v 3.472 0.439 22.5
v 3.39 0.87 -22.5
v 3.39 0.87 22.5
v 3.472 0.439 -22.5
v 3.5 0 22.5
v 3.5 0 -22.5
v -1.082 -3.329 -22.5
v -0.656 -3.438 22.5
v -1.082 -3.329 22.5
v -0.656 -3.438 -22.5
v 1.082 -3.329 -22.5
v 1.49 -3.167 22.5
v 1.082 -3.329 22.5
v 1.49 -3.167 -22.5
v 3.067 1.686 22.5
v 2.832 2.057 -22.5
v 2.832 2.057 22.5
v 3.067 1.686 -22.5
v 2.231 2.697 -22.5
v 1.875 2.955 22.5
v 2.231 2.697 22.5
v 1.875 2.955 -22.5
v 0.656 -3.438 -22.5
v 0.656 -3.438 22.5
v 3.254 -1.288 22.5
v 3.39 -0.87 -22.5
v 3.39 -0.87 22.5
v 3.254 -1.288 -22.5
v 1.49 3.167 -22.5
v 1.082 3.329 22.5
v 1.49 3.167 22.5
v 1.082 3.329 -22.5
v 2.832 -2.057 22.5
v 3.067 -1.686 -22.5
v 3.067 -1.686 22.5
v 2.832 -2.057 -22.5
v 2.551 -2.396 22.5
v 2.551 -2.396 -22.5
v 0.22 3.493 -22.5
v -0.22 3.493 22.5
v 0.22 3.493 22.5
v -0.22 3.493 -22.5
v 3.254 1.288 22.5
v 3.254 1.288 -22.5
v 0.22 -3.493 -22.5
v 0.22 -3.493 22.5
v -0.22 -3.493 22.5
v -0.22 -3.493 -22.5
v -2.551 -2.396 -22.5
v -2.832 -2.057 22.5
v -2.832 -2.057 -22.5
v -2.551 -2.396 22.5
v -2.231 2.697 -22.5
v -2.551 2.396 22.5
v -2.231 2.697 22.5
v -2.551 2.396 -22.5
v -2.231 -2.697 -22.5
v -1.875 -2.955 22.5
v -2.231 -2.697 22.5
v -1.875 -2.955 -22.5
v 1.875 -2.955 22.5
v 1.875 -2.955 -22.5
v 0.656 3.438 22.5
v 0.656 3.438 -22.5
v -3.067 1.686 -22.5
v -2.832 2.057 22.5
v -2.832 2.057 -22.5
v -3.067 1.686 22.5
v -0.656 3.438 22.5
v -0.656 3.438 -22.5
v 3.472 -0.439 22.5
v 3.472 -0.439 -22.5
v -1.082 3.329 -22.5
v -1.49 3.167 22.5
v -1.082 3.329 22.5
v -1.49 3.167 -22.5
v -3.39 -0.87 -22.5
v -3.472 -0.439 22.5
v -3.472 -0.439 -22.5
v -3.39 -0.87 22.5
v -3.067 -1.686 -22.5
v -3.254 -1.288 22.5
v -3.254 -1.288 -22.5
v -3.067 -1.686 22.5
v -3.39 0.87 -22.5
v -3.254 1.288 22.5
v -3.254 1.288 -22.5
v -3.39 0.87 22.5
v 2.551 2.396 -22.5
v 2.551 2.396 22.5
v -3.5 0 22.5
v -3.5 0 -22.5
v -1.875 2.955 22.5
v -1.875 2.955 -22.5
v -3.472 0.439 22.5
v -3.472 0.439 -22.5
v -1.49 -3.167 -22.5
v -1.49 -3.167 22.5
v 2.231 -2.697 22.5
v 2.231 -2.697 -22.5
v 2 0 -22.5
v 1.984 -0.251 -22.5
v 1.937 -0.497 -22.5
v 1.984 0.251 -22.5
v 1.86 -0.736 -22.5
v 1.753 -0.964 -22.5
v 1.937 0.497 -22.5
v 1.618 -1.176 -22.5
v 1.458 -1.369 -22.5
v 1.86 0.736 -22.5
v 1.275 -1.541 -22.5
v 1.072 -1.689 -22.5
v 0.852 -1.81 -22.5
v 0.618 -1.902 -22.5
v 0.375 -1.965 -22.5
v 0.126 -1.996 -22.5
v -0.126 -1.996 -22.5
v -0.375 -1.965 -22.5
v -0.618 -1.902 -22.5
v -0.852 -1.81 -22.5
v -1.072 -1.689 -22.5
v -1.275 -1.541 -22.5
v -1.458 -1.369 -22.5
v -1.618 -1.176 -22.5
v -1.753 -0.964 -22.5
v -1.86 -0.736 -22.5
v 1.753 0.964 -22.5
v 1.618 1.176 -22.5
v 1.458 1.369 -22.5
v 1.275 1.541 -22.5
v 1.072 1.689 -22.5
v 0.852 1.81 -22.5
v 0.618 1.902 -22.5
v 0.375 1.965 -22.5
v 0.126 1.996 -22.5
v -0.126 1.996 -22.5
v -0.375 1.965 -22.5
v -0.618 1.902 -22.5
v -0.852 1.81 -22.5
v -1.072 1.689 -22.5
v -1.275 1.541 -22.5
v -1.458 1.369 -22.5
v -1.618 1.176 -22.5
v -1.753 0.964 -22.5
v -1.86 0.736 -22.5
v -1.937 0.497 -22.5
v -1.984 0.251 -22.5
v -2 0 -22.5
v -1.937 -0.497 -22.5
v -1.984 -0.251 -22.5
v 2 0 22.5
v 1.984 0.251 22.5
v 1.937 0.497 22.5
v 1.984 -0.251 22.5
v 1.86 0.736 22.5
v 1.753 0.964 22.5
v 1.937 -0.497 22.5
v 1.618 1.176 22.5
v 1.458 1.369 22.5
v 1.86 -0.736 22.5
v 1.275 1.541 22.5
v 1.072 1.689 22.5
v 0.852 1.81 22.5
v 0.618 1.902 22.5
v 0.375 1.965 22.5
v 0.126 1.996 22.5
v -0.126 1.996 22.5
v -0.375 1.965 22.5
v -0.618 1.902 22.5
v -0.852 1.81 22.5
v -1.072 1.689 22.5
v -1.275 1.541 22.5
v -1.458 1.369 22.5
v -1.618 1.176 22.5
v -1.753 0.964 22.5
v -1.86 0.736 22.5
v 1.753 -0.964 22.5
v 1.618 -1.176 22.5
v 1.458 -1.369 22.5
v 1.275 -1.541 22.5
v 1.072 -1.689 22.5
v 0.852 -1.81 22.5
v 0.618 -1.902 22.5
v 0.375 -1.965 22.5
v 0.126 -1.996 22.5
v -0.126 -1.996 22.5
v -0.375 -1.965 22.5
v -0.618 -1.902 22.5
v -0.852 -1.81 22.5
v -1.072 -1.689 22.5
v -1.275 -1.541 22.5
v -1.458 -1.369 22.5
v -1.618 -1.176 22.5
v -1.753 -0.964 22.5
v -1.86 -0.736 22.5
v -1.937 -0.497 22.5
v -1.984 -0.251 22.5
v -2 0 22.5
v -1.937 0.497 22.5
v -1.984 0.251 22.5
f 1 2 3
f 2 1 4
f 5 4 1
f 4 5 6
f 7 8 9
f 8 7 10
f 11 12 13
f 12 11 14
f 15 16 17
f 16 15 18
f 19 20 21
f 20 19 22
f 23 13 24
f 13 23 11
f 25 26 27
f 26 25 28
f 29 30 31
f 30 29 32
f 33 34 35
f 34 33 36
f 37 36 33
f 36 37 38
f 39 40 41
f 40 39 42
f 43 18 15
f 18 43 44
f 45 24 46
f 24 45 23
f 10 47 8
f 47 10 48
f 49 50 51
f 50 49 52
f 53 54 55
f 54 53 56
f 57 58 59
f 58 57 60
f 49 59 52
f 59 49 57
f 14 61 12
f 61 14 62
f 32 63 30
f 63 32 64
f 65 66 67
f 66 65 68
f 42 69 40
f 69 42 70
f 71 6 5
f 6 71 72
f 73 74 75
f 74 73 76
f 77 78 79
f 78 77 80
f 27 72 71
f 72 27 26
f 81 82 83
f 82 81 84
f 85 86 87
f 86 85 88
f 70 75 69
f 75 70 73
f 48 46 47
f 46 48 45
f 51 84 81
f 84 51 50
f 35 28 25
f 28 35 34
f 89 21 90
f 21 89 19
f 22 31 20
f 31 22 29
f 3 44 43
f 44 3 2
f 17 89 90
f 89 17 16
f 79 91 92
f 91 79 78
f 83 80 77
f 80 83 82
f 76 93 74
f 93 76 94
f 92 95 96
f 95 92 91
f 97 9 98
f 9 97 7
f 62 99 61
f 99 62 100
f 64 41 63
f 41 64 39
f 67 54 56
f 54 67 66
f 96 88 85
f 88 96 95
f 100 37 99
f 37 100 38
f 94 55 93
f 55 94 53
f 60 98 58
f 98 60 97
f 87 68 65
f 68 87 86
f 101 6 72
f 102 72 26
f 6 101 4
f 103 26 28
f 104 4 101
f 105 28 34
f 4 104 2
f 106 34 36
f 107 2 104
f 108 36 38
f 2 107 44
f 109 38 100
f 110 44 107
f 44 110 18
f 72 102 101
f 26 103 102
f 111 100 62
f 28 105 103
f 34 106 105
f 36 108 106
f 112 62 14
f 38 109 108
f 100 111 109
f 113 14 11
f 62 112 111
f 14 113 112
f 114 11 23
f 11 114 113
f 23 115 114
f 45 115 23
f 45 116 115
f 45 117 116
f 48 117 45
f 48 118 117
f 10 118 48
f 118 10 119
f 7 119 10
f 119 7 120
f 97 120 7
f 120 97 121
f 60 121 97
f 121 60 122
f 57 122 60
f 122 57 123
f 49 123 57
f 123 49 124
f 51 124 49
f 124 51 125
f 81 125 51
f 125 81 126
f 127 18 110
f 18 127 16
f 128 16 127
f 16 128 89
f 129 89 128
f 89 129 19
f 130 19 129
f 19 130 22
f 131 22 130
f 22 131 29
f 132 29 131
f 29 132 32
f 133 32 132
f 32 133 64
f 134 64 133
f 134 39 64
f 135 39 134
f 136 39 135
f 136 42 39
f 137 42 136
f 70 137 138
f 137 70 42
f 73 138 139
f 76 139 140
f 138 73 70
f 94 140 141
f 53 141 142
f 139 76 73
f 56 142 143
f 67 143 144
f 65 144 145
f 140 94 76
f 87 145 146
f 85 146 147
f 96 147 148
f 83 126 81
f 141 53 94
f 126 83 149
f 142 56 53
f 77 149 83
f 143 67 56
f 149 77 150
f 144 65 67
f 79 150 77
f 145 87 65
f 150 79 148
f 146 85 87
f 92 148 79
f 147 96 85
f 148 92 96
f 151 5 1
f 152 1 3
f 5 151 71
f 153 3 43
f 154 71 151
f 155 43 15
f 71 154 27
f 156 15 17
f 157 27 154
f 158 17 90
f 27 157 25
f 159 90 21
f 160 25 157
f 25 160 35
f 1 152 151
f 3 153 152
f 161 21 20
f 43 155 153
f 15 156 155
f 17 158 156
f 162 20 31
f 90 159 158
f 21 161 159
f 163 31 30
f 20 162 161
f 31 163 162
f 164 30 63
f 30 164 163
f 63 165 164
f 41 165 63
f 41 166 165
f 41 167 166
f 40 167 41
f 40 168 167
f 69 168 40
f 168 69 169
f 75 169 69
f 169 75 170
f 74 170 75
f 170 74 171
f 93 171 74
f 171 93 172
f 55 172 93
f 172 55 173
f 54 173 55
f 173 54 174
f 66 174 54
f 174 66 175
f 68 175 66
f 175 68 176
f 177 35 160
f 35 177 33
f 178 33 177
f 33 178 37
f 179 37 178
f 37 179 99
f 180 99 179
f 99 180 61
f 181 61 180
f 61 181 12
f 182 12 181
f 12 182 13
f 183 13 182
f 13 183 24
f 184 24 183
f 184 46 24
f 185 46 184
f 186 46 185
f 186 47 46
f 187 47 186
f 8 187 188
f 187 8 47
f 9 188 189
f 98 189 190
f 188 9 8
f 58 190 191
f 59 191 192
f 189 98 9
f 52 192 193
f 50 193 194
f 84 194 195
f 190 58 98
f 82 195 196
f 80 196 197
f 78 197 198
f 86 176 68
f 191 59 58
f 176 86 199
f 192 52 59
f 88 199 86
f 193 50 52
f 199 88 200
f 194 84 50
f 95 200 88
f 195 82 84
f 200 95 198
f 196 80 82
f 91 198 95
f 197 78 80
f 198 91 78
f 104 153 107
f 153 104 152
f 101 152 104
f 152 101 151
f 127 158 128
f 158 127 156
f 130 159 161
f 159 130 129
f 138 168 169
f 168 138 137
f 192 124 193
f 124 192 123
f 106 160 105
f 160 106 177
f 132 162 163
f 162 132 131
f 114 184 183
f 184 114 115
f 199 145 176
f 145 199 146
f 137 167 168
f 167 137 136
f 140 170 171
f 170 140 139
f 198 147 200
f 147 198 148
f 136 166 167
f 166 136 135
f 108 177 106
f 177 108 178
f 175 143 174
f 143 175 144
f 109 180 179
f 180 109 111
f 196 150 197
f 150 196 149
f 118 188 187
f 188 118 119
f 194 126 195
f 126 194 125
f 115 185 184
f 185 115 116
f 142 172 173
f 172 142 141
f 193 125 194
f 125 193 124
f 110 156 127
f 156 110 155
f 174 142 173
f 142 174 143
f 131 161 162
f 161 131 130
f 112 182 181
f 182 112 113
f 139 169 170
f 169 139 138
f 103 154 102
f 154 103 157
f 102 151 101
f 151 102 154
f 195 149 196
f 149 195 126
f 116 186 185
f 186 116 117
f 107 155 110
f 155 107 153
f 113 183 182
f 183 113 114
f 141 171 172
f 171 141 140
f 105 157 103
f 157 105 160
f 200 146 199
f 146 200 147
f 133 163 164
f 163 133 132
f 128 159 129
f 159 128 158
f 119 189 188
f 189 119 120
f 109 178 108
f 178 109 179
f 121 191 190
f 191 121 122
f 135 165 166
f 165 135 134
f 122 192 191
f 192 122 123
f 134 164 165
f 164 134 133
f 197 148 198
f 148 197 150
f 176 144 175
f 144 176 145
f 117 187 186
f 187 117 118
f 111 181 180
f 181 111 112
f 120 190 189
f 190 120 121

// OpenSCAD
$fn = 50;


difference() {
	union() {
		translate(v = [0, 0, -22.5000000000]) {
			cylinder(h = 45, r = 3.5000000000);
		}
	}
	union() {
		translate(v = [0, 0, -100.0000000000]) {
			cylinder(h = 200, r = 2.0000000000);
		}
	}
}
